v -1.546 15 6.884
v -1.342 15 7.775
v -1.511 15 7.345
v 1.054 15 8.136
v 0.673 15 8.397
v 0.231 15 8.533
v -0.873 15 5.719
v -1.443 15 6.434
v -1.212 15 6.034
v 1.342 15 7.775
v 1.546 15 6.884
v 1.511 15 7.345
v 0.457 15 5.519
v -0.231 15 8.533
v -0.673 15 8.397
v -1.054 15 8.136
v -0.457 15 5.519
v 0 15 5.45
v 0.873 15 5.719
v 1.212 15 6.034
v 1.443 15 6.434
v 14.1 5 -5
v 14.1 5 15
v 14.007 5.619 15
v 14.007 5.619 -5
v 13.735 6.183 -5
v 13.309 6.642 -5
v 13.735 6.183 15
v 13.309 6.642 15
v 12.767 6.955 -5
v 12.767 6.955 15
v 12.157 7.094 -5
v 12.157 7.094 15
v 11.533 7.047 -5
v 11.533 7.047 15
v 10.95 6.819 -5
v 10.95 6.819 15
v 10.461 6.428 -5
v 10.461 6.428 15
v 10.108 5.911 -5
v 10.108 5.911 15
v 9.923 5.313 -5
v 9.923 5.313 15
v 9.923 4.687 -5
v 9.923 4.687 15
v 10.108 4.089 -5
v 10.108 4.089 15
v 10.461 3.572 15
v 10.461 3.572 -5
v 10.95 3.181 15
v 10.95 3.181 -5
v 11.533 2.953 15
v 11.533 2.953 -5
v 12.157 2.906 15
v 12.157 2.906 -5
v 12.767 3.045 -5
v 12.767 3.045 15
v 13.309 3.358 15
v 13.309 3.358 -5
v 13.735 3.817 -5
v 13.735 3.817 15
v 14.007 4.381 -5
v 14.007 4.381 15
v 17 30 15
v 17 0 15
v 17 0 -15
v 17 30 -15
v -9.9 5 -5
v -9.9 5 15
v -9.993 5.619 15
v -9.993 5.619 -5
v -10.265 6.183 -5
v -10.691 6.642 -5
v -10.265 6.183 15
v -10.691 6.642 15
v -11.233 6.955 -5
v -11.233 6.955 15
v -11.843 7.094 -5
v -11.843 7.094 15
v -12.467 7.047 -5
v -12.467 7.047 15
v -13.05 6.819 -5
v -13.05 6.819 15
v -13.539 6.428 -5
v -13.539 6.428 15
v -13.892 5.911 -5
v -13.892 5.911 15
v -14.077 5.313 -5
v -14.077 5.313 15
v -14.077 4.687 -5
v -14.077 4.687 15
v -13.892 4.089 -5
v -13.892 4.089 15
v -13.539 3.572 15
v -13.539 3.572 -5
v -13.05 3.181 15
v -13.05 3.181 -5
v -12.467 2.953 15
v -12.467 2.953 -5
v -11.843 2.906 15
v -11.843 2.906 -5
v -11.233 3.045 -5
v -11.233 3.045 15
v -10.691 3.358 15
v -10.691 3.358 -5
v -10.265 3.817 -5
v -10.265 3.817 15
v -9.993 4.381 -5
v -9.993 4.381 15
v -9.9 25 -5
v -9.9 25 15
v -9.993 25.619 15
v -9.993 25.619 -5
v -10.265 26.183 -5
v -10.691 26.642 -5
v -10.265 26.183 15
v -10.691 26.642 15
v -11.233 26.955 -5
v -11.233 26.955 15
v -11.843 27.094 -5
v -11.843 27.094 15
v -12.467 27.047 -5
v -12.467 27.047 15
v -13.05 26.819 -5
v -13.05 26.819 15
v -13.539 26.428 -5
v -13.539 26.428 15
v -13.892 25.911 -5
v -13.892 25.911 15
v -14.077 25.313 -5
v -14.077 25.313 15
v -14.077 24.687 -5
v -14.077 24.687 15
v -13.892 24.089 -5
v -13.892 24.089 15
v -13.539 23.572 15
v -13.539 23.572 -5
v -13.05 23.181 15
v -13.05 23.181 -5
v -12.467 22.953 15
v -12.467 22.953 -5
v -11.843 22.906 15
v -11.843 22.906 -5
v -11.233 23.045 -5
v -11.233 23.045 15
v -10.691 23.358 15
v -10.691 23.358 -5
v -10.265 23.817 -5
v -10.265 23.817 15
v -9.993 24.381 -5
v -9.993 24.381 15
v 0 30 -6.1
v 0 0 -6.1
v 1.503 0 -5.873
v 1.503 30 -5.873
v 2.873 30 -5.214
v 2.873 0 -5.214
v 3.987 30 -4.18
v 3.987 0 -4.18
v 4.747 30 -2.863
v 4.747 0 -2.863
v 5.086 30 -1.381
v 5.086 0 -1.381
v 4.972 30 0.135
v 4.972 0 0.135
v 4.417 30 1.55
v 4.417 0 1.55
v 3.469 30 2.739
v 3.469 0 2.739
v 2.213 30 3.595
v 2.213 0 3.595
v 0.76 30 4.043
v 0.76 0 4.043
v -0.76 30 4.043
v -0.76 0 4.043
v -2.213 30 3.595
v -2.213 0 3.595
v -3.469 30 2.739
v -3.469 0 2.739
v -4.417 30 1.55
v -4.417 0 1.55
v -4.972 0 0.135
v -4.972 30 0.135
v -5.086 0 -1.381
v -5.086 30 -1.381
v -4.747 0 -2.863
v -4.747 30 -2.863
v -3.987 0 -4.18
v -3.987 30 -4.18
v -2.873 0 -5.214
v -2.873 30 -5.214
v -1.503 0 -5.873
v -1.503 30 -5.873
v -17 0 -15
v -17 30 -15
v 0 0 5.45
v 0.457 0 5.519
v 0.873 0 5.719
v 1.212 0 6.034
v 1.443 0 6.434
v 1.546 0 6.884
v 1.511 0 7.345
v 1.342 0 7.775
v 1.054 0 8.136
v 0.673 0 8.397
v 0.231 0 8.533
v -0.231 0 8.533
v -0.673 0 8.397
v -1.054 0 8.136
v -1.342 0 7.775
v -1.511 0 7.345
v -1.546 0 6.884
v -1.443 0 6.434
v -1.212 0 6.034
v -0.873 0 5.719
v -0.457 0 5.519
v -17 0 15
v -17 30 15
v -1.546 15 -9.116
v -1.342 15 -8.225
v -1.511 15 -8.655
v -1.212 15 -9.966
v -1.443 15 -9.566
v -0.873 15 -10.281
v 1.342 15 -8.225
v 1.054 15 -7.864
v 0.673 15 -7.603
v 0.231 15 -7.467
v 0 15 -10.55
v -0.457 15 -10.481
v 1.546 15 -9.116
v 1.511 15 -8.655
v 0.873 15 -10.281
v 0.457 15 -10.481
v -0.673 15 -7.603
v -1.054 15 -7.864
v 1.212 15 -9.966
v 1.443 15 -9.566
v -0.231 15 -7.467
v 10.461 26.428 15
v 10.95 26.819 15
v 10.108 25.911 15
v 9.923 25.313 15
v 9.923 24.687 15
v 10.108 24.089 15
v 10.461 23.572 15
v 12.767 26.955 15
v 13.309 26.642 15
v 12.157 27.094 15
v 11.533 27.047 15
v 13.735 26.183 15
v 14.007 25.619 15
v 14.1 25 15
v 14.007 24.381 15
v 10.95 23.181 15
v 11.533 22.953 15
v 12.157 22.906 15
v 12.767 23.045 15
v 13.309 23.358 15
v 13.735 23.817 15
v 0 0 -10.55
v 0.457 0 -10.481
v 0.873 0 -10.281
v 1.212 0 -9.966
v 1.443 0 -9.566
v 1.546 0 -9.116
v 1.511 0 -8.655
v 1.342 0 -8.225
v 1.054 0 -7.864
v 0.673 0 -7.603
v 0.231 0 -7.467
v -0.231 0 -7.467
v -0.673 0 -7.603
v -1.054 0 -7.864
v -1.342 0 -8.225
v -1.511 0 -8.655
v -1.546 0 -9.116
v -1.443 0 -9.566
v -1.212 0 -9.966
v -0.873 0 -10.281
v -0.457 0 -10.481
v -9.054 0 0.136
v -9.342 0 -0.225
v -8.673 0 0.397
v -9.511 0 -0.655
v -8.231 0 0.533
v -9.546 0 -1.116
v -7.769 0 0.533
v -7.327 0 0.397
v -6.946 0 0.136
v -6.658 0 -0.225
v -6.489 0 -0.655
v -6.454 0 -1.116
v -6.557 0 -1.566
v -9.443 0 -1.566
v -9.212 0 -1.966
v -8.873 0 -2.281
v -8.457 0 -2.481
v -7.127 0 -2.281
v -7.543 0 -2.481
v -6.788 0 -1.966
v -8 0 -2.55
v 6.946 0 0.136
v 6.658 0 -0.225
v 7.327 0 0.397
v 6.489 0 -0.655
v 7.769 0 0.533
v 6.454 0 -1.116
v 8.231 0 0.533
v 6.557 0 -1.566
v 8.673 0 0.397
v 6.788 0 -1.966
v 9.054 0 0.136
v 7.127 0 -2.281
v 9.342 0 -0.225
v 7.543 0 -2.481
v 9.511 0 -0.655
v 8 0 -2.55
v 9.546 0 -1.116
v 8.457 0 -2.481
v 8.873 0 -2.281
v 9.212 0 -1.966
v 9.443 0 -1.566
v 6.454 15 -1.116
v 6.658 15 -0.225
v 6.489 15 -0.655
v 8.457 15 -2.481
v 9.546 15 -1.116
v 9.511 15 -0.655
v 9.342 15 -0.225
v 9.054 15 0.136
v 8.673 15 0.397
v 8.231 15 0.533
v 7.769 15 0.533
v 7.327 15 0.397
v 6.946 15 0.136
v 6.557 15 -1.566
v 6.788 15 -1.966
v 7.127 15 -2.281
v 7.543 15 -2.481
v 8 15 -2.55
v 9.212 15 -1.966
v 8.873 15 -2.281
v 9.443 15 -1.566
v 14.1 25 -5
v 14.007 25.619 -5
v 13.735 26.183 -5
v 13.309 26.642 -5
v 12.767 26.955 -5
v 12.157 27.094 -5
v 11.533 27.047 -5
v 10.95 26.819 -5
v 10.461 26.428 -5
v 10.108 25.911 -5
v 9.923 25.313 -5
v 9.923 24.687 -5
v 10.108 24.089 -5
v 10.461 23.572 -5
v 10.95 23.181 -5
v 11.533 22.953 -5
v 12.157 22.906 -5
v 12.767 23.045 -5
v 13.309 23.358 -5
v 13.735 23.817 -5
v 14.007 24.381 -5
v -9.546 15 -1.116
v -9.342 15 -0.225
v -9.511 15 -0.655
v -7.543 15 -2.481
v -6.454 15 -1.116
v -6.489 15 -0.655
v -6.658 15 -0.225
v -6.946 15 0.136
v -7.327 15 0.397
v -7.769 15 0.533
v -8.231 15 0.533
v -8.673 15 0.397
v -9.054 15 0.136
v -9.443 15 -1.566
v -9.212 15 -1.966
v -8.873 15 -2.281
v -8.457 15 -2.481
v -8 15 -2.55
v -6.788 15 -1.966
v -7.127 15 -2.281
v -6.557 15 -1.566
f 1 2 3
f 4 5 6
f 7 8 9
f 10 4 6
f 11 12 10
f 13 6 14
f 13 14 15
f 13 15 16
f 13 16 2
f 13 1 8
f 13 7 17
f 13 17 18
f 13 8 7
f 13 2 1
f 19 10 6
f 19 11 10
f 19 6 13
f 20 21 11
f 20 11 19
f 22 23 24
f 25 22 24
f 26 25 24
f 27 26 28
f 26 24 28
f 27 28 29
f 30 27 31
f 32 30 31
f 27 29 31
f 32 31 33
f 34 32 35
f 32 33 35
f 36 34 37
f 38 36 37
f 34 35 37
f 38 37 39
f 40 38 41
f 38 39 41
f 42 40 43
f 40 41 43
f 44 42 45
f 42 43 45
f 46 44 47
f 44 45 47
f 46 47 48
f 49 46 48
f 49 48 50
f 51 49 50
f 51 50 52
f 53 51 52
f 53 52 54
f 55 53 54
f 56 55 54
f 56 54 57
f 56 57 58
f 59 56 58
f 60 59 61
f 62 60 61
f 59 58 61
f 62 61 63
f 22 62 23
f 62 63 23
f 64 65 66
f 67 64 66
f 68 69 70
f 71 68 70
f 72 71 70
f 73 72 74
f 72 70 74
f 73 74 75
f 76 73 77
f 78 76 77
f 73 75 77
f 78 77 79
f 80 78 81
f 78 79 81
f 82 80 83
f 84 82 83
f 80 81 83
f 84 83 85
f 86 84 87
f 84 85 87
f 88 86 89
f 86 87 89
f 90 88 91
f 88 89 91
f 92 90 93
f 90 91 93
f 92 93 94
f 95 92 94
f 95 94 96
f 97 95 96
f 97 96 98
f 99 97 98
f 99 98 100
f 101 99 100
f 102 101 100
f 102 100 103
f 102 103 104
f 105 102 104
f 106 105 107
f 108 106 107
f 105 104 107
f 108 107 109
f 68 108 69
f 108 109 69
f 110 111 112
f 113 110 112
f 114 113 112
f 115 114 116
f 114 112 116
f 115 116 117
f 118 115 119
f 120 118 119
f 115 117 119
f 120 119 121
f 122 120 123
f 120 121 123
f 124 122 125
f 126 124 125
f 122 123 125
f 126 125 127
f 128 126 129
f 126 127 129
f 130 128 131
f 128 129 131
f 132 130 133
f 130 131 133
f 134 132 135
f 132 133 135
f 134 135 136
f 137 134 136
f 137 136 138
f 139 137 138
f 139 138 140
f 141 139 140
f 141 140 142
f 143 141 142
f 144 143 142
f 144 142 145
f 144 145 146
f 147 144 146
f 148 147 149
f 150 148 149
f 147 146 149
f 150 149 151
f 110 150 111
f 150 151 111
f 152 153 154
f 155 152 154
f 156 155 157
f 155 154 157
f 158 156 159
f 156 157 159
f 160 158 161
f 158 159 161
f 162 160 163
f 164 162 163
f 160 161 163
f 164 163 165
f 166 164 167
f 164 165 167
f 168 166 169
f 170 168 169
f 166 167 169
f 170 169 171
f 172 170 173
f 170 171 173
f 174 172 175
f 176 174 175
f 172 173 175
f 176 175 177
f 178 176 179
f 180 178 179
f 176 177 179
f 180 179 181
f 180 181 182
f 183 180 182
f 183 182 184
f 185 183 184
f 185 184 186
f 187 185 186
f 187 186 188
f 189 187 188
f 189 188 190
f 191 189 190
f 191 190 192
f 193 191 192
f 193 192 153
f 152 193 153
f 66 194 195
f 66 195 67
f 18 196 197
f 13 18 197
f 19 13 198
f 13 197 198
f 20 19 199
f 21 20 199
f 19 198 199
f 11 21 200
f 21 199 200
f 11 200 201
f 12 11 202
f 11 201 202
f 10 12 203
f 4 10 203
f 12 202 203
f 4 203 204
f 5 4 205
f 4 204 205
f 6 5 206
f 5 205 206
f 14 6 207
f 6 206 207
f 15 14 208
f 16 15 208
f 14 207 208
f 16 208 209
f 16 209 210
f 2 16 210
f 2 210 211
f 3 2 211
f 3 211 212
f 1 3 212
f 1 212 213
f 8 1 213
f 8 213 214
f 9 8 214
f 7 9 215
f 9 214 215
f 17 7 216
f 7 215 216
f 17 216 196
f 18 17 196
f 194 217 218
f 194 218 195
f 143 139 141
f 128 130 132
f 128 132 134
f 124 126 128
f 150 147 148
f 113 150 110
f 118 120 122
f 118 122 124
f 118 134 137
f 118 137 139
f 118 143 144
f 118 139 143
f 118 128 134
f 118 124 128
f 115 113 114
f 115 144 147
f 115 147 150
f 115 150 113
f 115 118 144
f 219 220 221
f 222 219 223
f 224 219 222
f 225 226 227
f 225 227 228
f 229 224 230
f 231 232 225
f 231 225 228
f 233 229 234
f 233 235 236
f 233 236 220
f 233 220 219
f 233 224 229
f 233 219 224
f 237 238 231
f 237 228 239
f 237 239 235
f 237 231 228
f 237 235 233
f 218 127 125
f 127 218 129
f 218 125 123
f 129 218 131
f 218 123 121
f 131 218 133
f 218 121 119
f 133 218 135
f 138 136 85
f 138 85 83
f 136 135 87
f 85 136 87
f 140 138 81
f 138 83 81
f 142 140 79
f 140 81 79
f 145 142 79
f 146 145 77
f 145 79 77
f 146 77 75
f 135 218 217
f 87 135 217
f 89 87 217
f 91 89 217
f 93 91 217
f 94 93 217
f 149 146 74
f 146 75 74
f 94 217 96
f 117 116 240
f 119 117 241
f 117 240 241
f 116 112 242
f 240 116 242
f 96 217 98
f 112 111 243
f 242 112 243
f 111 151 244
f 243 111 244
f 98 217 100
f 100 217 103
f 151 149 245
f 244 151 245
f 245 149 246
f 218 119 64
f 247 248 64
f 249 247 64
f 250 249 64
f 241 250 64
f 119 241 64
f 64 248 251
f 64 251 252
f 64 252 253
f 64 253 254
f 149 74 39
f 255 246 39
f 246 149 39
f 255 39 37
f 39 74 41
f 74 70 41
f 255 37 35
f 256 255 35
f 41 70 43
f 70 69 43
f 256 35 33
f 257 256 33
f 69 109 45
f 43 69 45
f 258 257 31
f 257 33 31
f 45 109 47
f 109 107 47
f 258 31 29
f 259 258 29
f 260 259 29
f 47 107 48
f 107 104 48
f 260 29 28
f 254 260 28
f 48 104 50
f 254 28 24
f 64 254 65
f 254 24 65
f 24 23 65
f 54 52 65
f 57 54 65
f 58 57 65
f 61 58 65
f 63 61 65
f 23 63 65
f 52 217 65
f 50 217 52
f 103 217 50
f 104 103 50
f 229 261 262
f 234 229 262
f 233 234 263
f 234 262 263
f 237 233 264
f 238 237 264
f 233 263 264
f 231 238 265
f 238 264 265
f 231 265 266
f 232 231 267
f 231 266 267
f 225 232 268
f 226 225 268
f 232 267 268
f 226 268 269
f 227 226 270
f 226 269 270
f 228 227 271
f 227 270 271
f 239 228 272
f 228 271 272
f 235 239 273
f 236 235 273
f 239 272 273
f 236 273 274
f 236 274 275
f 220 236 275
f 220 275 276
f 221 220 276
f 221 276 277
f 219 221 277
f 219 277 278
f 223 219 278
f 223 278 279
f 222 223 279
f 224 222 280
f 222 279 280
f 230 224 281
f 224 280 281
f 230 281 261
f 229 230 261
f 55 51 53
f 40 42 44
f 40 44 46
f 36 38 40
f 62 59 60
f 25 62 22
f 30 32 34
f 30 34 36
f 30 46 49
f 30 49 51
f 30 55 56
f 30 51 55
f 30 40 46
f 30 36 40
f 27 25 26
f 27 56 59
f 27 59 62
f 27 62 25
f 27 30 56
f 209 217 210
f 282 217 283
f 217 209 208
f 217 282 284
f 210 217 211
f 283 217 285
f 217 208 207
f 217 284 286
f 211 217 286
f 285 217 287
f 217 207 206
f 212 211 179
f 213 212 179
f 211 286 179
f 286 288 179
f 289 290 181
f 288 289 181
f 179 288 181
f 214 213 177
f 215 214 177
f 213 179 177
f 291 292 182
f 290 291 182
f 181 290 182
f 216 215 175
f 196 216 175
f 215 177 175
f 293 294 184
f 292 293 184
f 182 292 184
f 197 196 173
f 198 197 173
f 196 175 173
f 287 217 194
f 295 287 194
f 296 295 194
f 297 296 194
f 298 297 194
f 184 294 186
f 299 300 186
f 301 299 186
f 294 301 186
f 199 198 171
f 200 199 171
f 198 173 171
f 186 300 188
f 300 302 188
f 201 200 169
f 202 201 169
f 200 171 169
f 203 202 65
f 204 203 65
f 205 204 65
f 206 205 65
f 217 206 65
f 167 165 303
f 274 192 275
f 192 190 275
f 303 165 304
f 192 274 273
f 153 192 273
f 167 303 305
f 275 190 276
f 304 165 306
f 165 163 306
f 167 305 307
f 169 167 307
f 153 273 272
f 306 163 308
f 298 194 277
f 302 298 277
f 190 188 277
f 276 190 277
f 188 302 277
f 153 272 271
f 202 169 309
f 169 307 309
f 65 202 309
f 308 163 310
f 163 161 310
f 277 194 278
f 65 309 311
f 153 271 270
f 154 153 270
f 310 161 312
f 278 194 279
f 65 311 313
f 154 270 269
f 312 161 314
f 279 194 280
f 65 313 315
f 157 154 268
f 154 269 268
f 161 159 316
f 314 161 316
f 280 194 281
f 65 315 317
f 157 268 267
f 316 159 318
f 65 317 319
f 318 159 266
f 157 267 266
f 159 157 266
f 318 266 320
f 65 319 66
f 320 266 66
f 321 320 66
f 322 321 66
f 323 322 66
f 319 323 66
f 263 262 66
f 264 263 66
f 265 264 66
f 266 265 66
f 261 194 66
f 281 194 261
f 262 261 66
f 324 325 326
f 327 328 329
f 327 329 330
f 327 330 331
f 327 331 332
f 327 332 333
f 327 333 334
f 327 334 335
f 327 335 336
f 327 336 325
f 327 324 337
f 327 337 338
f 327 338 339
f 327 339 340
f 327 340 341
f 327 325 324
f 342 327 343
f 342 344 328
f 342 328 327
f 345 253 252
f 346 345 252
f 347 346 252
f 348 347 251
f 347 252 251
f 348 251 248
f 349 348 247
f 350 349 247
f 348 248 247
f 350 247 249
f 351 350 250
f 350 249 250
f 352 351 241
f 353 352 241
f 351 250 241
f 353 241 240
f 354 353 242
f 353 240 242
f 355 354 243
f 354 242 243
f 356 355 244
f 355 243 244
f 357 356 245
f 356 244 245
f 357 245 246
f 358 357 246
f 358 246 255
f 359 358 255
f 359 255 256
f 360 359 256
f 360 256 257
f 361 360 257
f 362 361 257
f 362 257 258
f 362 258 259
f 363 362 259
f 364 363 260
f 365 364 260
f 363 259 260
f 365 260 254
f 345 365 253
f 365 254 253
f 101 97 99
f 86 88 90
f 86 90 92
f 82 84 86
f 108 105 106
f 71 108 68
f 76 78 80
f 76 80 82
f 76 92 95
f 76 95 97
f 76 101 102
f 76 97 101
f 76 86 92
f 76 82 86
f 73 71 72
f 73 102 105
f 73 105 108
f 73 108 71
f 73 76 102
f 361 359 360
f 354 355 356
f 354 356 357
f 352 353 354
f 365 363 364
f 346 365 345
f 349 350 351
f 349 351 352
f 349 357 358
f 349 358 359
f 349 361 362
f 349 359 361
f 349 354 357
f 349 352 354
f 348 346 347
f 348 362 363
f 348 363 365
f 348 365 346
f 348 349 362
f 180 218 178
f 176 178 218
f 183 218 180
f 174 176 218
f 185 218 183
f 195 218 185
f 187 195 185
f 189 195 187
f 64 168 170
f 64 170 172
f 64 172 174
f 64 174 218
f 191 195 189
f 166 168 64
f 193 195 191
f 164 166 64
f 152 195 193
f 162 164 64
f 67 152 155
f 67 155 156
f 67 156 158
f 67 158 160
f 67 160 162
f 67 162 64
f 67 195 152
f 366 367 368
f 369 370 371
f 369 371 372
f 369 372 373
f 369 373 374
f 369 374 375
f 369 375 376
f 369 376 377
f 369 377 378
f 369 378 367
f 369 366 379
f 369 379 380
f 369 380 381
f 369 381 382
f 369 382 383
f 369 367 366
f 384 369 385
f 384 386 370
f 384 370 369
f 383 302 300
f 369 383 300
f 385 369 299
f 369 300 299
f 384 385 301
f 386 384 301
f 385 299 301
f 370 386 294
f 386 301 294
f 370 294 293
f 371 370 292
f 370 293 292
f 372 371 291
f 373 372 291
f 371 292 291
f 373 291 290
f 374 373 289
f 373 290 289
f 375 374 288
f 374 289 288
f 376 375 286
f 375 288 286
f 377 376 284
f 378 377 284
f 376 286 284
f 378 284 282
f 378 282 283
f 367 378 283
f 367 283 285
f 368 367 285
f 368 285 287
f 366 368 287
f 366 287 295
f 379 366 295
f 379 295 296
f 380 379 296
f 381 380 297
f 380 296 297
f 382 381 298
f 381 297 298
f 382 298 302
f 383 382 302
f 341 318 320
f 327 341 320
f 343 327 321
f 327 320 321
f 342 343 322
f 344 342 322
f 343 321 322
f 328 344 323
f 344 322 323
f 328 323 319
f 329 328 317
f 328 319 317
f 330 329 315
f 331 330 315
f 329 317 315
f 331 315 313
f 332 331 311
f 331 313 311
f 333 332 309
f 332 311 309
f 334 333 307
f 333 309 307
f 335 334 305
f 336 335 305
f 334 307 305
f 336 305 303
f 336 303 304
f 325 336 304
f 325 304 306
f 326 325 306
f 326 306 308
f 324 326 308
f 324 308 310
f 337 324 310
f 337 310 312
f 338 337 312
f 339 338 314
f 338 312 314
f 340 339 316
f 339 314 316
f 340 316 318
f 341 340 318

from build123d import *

# Parameters (mm, degrees)
SKETCH_1_W          = 34
SKETCH_1_H          = 30
EXTRUDE_1_DEPTH     = 30
SKETCH_2_R          = 5.1
CUT_EXTRUDE_1_DEPTH = 38.603191354
SKETCH_3_R          = 1.55
CUT_EXTRUDE_2_DEPTH = 15
SKETCH_4_R          = 2.1
CUT_EXTRUDE_3_DEPTH = 20


with BuildPart() as part:
    # 草图1 → 凸台-拉伸1 (new body)
    with BuildSketch(Plane(origin=(0, 0, 0), x_dir=(1, 0, 0), z_dir=(0, 1, 0))):
        Rectangle(SKETCH_1_W, SKETCH_1_H)
    extrude(amount=EXTRUDE_1_DEPTH)

    # 草图2 → 切除-拉伸1 (cut, through all)
    with BuildSketch(Plane(origin=(0, 0, 0), x_dir=(-1, 0, 0), z_dir=(0, -1, 0))):
        with Locations(Location((0, 1, 0), (0, 0, 90))):
            Circle(SKETCH_2_R)
    extrude(amount=-CUT_EXTRUDE_1_DEPTH, mode=Mode.SUBTRACT)

    # 草图3 → 切除-拉伸2 (cut)
    with BuildSketch(Plane(origin=(0, 0, 0), x_dir=(-1, 0, 0), z_dir=(0, -1, 0))):
        with Locations(Location((8, 1, 0), (0, 0, 90))):
            Circle(SKETCH_3_R)
        with Locations(Location((0, -7, 0), (0, 0, 90))):
            Circle(SKETCH_3_R)
        with Locations(Location((-8, 1, 0), (0, 0, 90))):
            Circle(SKETCH_3_R)
        with Locations(Location((0, 9, 0), (0, 0, 90))):
            Circle(SKETCH_3_R)
    extrude(amount=-CUT_EXTRUDE_2_DEPTH, mode=Mode.SUBTRACT)

    # 草图4 → 切除-拉伸3 (cut)
    with BuildSketch(Plane.XY.offset(15)):
        with Locations((-12, 5)):
            Circle(SKETCH_4_R)
        with Locations((12, 5)):
            Circle(SKETCH_4_R)
        with Locations((12, 25)):
            Circle(SKETCH_4_R)
        with Locations((-12, 25)):
            Circle(SKETCH_4_R)
    extrude(amount=-CUT_EXTRUDE_3_DEPTH, mode=Mode.SUBTRACT)


solid = part.part
